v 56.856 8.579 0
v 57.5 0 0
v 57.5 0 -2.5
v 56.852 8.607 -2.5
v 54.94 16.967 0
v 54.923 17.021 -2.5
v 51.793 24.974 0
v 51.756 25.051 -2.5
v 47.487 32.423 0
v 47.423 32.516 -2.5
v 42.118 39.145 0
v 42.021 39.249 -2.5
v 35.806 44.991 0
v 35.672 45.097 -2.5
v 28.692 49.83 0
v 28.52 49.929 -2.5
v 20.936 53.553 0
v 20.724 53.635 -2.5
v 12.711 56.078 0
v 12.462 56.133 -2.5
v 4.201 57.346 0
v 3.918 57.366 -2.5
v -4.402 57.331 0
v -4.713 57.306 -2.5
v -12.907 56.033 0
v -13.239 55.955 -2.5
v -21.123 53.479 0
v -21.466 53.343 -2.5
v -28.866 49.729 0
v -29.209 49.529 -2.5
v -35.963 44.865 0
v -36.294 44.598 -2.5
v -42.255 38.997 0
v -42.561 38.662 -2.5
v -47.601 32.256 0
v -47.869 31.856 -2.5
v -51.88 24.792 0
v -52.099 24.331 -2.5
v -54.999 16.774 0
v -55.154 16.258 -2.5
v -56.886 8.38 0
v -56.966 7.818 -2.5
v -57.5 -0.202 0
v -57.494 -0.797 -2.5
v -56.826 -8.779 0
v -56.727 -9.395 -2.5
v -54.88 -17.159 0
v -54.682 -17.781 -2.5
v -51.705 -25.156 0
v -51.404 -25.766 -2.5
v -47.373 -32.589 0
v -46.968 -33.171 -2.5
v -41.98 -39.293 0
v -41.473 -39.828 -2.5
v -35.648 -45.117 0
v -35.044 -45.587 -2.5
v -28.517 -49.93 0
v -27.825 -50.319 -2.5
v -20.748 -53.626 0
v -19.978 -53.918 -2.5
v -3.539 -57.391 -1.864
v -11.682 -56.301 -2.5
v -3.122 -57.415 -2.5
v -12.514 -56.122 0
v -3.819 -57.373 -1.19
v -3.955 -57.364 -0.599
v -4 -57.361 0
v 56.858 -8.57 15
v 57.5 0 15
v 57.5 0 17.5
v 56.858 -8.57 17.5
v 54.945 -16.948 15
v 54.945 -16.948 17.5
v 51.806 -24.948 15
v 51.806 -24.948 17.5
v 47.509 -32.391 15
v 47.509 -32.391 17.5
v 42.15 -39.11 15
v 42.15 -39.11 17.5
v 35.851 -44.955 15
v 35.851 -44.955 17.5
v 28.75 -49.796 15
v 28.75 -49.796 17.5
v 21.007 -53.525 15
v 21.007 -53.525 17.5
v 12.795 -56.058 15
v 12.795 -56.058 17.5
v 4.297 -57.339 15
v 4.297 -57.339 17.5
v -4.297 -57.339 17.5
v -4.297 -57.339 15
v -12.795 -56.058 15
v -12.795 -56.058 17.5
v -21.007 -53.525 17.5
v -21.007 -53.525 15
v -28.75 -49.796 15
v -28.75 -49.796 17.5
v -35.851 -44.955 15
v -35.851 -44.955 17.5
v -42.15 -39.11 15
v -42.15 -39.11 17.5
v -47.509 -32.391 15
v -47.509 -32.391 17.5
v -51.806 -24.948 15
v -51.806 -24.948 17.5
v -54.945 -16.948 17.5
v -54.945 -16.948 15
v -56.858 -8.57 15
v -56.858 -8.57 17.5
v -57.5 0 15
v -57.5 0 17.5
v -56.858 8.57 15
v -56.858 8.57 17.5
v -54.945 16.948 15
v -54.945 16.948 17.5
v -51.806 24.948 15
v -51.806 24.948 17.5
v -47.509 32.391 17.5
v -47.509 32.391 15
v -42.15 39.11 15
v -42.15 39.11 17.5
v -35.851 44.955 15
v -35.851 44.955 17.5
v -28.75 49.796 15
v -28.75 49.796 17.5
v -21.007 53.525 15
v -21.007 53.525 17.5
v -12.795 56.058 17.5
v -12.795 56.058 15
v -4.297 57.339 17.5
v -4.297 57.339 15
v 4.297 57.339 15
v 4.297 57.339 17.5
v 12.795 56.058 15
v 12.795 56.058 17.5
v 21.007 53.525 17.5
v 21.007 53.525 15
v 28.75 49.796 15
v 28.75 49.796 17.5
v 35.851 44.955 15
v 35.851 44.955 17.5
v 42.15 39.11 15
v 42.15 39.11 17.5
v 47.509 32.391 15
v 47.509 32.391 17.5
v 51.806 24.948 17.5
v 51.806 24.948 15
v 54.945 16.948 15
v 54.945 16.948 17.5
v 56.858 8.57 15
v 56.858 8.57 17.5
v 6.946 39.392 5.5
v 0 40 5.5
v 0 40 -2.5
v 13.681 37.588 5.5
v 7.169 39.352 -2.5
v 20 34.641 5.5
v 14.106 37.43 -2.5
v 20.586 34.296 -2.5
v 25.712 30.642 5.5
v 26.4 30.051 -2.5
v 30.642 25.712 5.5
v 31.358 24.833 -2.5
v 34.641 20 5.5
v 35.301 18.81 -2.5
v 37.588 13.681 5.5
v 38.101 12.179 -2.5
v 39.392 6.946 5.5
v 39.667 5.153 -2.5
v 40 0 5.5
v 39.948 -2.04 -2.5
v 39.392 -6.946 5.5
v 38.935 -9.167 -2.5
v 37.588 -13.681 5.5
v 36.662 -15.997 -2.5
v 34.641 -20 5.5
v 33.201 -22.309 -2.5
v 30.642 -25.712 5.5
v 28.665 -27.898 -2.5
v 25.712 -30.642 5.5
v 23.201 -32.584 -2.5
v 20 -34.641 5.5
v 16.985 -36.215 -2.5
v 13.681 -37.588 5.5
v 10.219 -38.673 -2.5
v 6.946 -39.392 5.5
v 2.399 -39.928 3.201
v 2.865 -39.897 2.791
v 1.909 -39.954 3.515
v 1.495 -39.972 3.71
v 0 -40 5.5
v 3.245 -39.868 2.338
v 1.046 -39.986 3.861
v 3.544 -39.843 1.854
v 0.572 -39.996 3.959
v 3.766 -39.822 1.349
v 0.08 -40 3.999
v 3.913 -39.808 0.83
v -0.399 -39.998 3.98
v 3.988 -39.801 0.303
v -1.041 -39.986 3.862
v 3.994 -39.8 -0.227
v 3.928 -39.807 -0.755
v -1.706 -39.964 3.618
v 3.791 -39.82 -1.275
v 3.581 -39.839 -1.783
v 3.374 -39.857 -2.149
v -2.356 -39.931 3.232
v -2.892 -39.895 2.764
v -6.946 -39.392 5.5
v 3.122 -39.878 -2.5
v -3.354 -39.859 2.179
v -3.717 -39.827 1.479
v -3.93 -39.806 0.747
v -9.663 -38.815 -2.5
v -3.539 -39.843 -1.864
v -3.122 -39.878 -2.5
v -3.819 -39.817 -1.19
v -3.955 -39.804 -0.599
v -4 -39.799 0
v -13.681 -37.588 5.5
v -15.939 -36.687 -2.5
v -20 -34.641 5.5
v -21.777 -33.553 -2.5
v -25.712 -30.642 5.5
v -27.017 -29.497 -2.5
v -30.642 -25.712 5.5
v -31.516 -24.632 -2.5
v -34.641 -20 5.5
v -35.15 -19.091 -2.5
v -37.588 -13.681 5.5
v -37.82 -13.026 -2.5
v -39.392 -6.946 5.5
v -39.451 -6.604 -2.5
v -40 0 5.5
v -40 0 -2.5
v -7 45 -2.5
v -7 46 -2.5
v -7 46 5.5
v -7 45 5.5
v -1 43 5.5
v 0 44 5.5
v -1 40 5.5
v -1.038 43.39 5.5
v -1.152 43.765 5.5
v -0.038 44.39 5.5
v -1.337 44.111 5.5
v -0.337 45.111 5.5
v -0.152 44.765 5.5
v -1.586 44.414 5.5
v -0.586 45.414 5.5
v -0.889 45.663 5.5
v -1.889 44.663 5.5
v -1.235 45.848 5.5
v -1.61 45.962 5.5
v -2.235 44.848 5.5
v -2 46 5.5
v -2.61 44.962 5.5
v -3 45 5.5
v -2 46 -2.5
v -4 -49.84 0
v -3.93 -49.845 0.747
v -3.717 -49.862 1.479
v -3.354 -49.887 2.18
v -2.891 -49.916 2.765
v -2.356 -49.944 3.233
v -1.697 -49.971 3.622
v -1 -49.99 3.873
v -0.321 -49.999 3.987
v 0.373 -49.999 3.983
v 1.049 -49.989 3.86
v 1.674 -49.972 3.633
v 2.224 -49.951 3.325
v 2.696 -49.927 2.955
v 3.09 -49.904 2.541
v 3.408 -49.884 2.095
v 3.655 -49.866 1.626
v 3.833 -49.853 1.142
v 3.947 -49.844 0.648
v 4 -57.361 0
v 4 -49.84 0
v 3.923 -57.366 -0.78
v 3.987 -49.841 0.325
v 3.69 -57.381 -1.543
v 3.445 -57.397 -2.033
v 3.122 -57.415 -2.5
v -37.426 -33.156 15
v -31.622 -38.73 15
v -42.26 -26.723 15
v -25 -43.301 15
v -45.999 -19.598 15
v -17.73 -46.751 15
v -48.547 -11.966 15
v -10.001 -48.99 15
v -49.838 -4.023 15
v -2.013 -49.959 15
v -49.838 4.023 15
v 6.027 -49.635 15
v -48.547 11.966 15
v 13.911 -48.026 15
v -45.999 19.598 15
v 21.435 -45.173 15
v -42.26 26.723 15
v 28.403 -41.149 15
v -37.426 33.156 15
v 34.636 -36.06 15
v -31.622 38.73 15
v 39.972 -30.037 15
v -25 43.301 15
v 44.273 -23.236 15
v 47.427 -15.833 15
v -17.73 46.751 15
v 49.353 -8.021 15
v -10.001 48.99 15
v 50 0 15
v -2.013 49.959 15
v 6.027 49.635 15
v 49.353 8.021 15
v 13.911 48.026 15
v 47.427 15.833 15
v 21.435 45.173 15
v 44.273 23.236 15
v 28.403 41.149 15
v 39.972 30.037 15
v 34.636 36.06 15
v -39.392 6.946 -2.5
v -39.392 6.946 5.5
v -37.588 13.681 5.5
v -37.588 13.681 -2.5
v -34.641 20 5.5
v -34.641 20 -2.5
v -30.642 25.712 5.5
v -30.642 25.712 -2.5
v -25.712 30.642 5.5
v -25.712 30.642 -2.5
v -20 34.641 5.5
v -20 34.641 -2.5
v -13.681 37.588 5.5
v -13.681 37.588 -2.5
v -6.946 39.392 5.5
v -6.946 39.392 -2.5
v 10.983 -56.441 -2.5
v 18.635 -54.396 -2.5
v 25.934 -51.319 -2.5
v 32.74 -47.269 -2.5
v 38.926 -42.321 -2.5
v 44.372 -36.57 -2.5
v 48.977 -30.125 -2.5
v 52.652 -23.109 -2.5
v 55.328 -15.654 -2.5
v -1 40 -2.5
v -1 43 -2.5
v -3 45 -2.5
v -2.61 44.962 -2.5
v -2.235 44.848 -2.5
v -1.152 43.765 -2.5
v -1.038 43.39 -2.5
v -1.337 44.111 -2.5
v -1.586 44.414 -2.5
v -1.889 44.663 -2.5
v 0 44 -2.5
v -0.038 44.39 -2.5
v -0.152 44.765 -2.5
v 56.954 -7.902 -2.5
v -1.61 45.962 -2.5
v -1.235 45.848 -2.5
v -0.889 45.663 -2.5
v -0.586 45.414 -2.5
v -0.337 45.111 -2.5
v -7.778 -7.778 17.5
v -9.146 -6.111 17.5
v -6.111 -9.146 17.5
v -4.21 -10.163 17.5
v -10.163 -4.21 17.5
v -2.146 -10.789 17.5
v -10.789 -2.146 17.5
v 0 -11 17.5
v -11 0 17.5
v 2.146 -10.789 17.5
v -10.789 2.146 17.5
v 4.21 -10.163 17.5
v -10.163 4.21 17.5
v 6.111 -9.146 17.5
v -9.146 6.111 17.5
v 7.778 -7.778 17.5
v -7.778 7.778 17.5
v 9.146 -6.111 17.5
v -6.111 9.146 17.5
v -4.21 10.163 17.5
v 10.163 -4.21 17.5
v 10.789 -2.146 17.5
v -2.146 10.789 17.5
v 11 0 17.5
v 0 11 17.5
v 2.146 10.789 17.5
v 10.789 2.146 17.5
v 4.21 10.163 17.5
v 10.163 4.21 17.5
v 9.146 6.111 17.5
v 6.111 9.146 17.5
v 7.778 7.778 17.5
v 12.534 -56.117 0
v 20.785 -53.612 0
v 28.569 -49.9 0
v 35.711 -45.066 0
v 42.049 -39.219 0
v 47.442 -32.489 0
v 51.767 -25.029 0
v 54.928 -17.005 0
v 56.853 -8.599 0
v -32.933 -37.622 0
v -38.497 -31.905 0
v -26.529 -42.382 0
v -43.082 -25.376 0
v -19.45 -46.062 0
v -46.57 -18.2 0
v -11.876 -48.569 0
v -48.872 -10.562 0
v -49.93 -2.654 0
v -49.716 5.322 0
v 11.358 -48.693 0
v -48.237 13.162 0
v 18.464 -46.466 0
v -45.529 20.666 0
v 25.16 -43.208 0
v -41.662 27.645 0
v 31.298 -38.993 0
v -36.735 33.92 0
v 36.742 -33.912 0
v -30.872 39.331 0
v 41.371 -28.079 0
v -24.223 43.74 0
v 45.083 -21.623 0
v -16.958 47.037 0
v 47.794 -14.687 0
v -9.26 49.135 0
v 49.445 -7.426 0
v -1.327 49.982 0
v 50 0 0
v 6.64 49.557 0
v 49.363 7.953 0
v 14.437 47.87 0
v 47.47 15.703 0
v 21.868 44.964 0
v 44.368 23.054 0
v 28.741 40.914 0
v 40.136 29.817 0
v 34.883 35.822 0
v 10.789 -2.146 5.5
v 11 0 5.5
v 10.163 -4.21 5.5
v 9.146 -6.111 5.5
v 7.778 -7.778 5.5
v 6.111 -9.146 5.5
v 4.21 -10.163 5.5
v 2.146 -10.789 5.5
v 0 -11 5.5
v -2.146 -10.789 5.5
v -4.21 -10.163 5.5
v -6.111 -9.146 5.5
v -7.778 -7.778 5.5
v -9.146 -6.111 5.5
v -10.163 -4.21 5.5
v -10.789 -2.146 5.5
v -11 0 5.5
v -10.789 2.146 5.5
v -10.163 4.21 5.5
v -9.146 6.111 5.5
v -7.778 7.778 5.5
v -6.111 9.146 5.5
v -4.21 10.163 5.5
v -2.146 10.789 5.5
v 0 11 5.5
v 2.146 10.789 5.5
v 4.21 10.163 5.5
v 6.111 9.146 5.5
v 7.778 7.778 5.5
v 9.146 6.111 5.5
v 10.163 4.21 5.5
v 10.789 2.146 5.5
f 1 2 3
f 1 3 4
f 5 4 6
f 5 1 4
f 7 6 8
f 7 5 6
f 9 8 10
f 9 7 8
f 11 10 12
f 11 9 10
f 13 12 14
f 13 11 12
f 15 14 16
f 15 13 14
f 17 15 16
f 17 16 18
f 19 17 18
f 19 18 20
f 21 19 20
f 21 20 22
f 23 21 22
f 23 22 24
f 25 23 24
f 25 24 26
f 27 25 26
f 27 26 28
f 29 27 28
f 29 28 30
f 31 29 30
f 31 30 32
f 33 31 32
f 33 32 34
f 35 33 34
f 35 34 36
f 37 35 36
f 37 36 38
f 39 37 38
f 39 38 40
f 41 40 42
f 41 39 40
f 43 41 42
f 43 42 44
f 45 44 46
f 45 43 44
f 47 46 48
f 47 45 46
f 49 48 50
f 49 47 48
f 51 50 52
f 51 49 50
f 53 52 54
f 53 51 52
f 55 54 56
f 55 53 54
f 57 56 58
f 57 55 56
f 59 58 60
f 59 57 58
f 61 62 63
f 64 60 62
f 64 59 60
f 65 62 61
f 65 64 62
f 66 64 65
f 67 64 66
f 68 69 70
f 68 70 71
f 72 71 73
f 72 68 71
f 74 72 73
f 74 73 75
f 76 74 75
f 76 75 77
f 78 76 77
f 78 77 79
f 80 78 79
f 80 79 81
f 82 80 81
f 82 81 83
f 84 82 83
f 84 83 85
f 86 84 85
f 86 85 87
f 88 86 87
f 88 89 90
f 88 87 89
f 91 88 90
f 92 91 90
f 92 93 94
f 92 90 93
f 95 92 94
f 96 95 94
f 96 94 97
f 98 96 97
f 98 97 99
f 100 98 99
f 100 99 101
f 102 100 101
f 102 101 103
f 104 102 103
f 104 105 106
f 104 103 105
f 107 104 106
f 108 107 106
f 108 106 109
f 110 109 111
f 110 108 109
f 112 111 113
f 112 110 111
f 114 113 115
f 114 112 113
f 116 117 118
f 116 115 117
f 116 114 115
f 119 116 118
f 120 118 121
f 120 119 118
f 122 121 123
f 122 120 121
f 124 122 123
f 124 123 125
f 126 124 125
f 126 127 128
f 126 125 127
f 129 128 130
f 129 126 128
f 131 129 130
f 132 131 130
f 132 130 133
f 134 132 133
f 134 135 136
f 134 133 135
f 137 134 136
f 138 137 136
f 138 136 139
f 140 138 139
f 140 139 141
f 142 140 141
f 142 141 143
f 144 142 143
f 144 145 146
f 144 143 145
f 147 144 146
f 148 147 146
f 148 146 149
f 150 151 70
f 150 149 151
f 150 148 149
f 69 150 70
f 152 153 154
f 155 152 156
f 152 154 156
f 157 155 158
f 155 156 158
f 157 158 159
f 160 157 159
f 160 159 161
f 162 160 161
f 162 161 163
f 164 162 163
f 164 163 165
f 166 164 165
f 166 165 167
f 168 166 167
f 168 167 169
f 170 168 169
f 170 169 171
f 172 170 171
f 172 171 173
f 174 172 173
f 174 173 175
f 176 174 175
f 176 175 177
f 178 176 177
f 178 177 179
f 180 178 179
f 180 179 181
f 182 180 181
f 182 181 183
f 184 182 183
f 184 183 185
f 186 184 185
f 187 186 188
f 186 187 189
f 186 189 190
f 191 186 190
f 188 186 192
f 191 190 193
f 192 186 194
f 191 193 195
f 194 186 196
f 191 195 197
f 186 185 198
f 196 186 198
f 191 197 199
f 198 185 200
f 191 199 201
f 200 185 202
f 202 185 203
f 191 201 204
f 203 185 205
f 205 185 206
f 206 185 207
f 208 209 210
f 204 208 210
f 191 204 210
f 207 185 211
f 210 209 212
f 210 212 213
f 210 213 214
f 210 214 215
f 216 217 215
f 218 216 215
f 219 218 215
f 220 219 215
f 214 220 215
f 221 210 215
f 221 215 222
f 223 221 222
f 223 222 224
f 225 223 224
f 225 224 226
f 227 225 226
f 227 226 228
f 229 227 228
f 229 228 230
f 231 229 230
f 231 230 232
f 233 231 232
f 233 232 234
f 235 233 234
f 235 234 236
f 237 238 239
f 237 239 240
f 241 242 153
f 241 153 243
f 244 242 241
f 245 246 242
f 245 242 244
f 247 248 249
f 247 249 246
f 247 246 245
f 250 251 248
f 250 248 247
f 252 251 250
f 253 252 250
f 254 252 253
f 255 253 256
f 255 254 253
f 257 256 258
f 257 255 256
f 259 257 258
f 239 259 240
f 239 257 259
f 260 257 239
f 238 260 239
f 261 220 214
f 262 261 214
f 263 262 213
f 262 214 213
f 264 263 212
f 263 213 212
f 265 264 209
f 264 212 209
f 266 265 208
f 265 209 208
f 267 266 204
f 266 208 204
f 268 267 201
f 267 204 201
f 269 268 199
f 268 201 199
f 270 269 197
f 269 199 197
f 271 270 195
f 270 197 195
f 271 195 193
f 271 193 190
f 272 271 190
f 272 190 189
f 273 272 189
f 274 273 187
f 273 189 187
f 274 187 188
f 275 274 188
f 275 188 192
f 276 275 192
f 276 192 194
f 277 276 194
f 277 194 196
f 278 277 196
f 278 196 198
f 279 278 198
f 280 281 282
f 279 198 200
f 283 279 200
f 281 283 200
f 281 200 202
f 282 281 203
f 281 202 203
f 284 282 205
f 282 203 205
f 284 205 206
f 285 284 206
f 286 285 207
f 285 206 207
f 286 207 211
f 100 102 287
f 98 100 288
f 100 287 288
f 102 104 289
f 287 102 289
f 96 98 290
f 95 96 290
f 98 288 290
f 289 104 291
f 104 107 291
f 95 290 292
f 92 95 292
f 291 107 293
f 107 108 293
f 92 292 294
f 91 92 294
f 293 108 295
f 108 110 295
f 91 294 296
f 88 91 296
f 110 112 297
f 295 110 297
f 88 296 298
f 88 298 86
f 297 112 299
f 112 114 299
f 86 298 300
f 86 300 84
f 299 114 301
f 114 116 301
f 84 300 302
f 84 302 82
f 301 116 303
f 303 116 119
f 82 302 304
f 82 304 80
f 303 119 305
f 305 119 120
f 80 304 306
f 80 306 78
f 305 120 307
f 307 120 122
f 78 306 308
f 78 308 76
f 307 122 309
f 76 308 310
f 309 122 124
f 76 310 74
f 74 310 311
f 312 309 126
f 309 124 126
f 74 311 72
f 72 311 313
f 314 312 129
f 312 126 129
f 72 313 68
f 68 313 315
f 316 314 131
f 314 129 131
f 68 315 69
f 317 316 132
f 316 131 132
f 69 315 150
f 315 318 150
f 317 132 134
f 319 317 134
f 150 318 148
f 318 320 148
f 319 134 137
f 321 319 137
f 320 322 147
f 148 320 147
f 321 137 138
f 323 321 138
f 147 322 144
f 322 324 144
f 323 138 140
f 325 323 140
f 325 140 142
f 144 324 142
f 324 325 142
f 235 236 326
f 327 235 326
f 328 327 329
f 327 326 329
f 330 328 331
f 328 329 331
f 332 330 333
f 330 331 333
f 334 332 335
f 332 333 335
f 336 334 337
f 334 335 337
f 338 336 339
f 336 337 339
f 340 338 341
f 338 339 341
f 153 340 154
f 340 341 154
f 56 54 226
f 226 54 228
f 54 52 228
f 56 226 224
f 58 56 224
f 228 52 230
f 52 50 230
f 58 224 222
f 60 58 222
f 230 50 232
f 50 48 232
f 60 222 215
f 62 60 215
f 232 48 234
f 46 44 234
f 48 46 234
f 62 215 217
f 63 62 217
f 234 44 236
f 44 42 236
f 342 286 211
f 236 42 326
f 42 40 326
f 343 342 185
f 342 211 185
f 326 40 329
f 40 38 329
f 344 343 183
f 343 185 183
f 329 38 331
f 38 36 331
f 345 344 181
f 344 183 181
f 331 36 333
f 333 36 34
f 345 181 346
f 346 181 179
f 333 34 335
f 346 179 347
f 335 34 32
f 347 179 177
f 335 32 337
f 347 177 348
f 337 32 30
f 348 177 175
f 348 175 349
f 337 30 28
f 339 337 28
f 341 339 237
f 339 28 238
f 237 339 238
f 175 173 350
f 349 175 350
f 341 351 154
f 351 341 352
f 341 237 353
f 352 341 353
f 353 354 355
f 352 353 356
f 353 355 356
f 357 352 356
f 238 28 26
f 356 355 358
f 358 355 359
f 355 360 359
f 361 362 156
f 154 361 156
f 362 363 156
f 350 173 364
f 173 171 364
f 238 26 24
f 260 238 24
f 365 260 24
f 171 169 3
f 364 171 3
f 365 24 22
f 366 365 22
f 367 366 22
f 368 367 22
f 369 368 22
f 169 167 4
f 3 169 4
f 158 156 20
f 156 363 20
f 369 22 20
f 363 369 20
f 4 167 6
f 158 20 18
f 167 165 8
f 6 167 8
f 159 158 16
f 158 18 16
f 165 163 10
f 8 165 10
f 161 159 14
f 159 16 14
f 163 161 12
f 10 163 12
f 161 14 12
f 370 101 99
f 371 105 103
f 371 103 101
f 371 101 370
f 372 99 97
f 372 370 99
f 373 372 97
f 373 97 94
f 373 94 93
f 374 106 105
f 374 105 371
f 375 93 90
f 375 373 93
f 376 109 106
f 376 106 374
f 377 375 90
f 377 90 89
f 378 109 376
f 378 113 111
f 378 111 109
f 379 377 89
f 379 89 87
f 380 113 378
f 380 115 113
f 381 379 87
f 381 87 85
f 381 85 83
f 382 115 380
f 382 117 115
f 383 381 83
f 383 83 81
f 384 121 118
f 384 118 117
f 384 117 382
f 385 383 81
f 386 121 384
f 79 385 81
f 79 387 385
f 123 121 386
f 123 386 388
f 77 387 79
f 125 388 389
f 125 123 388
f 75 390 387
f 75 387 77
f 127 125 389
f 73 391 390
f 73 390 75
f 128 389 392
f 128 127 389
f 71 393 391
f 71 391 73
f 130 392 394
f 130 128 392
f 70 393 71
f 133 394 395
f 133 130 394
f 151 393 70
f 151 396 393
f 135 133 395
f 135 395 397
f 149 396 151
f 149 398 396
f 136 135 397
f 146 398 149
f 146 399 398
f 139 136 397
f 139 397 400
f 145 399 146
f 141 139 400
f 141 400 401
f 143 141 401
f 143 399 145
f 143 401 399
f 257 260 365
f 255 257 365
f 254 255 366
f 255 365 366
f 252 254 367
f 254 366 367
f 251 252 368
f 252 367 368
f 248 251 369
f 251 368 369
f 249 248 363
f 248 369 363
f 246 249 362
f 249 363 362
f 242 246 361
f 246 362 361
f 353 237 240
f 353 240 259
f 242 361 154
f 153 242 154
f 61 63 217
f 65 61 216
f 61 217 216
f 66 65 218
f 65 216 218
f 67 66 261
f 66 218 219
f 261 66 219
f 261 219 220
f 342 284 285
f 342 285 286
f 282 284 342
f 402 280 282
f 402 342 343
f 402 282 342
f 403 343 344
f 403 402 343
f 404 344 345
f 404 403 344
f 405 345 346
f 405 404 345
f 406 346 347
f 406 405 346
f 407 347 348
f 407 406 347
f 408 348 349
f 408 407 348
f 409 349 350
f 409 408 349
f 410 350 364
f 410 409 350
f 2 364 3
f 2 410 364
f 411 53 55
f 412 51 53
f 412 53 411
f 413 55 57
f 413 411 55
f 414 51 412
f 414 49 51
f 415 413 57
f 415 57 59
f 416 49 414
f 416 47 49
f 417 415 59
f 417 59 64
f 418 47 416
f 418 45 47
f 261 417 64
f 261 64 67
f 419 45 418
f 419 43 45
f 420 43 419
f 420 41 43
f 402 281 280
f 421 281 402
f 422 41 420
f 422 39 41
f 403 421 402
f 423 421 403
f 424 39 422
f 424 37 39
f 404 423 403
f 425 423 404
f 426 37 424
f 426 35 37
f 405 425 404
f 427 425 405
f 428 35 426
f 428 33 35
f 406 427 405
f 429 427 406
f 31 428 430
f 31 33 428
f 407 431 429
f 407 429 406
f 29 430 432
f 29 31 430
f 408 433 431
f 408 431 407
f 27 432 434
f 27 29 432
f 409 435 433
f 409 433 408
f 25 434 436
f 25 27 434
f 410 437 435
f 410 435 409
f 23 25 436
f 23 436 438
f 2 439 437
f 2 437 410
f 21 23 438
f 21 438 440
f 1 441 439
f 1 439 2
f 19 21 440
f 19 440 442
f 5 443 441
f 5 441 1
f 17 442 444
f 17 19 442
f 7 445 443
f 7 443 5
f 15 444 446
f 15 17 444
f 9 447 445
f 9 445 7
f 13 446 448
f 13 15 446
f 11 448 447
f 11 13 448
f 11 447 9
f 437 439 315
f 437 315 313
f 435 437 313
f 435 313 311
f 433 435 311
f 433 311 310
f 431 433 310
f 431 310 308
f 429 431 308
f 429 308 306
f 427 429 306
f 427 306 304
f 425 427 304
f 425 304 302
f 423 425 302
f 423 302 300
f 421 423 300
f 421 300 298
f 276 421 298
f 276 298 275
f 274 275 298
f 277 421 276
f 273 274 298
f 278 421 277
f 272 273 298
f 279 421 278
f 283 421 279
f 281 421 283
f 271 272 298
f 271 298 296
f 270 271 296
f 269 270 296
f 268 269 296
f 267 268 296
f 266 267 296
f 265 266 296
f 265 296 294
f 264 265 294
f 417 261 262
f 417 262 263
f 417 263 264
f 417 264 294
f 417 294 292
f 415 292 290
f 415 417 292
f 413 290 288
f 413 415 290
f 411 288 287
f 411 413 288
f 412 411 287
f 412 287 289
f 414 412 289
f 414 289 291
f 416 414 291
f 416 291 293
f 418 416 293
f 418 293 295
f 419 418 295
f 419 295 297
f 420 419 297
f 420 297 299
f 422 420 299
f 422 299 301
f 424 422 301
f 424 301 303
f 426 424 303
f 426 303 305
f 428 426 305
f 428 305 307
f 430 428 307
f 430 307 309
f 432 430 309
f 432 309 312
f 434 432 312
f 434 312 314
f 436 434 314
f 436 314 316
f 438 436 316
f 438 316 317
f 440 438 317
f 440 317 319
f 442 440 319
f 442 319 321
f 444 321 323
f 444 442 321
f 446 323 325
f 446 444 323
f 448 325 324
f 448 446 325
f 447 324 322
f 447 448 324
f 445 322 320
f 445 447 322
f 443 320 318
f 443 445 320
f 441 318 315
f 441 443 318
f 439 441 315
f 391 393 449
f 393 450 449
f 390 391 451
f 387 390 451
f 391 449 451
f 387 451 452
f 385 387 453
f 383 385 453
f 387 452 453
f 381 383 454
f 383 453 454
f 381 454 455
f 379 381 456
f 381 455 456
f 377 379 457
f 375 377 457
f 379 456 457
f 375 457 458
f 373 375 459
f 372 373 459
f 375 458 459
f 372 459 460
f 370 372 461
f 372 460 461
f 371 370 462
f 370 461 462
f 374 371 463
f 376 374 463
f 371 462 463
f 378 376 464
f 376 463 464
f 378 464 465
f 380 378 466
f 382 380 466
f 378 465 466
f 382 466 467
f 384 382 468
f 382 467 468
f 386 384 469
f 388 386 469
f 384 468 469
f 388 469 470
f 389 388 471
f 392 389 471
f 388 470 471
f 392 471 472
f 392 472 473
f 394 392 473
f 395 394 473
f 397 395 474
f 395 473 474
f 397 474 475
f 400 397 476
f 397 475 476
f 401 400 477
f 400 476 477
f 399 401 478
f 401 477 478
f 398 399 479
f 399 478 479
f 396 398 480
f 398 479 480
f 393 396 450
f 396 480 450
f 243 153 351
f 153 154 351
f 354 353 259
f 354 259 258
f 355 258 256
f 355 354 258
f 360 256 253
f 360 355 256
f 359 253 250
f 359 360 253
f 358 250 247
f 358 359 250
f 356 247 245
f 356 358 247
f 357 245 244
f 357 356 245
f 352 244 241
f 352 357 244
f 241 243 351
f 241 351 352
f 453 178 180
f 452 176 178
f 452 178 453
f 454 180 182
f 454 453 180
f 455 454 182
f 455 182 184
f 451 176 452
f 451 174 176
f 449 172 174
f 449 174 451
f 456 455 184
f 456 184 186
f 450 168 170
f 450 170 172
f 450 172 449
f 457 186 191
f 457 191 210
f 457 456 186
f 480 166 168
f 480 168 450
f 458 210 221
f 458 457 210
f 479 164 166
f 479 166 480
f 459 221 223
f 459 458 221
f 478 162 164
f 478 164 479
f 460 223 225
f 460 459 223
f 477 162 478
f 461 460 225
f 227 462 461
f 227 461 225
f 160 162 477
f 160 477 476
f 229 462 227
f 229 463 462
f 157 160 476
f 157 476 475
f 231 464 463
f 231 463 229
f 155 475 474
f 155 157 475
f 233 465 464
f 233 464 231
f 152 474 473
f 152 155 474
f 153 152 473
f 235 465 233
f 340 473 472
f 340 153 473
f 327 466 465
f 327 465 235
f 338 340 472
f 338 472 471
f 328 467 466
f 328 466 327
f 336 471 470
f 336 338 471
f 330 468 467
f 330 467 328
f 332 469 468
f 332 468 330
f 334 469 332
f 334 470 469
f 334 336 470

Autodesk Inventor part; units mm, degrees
ref_plane "YZ Plane" through (0, 0, 0) normal (1, 0, 0) x (0, 1, 0)
ref_plane "XZ Plane" through (0, 0, 0) normal (0, 1, 0) x (-1, 0, 0)
ref_plane "XY Plane" through (0, 0, 0) normal (0, 0, 1) x (1, 0, 0)
sketch "Sketch1" plane through (0, 0, 0) normal (0, 0, 1) x (1, 0, 0)
  circle A0 centre (0, 0) radius 50
  circle A1 centre (0, 0) radius 11
  circle A2 centre (0, 0) radius 57.5
  dimension "d0" = 100
  dimension "d1" = 22
  dimension "d2" = 115
extrude "Extrusion7" add sketch "Sketch1" along normal blind 17.5 and the other way blind 2.5 contours A0
extrude "Extrusion8" add sketch "Sketch1" along normal blind 17.5 and the other way blind 2.5
extrude "Extrusion9" cut sketch "Sketch1" along normal blind 15 contours A2
extrude "Extrusion10" cut sketch "Sketch1" along normal blind 20 and the other way blind 10 contours A1
sketch "Sketch5" plane through (0, 0, -2.5) normal (0, 0, -1) x (-1, 0, 0)
  circle A0 centre (0, 0) radius 40
  line L0 (0, 40) -> (1, 40)
  line L1 (1, 40) -> (1, 43)
  line L2 (0, 44) -> (0, 40)
  line L3 (7, 46) -> (7, 45)
  line L4 (7, 45) -> (3, 45)
  arc A1 (3, 45) -> (1, 43) centre (3, 43) ccw
  arc A2 (2, 46) -> (0, 44) centre (2, 44) ccw
  line L5 (2, 46) -> (7, 46)
  dimension "d35" = 80
  dimension "d37" = 1
  dimension "d38" = 4
  dimension "d39" = 2
  dimension "d40" = 2
  dimension "d41" = 1
  dimension "d42" = 7
extrude "Extrusion11" cut sketch "Sketch5" against normal blind 8
sketch "Sketch6" plane through (0, 0, 0) normal (0, 1, 0) x (-1, 0, 0)
  circle A0 centre (0, 0) radius 4
  dimension "d45" = 8
extrude "Extrusion12" cut sketch "Sketch6" against normal blind 77.25
properties part number "Return_Spool"
